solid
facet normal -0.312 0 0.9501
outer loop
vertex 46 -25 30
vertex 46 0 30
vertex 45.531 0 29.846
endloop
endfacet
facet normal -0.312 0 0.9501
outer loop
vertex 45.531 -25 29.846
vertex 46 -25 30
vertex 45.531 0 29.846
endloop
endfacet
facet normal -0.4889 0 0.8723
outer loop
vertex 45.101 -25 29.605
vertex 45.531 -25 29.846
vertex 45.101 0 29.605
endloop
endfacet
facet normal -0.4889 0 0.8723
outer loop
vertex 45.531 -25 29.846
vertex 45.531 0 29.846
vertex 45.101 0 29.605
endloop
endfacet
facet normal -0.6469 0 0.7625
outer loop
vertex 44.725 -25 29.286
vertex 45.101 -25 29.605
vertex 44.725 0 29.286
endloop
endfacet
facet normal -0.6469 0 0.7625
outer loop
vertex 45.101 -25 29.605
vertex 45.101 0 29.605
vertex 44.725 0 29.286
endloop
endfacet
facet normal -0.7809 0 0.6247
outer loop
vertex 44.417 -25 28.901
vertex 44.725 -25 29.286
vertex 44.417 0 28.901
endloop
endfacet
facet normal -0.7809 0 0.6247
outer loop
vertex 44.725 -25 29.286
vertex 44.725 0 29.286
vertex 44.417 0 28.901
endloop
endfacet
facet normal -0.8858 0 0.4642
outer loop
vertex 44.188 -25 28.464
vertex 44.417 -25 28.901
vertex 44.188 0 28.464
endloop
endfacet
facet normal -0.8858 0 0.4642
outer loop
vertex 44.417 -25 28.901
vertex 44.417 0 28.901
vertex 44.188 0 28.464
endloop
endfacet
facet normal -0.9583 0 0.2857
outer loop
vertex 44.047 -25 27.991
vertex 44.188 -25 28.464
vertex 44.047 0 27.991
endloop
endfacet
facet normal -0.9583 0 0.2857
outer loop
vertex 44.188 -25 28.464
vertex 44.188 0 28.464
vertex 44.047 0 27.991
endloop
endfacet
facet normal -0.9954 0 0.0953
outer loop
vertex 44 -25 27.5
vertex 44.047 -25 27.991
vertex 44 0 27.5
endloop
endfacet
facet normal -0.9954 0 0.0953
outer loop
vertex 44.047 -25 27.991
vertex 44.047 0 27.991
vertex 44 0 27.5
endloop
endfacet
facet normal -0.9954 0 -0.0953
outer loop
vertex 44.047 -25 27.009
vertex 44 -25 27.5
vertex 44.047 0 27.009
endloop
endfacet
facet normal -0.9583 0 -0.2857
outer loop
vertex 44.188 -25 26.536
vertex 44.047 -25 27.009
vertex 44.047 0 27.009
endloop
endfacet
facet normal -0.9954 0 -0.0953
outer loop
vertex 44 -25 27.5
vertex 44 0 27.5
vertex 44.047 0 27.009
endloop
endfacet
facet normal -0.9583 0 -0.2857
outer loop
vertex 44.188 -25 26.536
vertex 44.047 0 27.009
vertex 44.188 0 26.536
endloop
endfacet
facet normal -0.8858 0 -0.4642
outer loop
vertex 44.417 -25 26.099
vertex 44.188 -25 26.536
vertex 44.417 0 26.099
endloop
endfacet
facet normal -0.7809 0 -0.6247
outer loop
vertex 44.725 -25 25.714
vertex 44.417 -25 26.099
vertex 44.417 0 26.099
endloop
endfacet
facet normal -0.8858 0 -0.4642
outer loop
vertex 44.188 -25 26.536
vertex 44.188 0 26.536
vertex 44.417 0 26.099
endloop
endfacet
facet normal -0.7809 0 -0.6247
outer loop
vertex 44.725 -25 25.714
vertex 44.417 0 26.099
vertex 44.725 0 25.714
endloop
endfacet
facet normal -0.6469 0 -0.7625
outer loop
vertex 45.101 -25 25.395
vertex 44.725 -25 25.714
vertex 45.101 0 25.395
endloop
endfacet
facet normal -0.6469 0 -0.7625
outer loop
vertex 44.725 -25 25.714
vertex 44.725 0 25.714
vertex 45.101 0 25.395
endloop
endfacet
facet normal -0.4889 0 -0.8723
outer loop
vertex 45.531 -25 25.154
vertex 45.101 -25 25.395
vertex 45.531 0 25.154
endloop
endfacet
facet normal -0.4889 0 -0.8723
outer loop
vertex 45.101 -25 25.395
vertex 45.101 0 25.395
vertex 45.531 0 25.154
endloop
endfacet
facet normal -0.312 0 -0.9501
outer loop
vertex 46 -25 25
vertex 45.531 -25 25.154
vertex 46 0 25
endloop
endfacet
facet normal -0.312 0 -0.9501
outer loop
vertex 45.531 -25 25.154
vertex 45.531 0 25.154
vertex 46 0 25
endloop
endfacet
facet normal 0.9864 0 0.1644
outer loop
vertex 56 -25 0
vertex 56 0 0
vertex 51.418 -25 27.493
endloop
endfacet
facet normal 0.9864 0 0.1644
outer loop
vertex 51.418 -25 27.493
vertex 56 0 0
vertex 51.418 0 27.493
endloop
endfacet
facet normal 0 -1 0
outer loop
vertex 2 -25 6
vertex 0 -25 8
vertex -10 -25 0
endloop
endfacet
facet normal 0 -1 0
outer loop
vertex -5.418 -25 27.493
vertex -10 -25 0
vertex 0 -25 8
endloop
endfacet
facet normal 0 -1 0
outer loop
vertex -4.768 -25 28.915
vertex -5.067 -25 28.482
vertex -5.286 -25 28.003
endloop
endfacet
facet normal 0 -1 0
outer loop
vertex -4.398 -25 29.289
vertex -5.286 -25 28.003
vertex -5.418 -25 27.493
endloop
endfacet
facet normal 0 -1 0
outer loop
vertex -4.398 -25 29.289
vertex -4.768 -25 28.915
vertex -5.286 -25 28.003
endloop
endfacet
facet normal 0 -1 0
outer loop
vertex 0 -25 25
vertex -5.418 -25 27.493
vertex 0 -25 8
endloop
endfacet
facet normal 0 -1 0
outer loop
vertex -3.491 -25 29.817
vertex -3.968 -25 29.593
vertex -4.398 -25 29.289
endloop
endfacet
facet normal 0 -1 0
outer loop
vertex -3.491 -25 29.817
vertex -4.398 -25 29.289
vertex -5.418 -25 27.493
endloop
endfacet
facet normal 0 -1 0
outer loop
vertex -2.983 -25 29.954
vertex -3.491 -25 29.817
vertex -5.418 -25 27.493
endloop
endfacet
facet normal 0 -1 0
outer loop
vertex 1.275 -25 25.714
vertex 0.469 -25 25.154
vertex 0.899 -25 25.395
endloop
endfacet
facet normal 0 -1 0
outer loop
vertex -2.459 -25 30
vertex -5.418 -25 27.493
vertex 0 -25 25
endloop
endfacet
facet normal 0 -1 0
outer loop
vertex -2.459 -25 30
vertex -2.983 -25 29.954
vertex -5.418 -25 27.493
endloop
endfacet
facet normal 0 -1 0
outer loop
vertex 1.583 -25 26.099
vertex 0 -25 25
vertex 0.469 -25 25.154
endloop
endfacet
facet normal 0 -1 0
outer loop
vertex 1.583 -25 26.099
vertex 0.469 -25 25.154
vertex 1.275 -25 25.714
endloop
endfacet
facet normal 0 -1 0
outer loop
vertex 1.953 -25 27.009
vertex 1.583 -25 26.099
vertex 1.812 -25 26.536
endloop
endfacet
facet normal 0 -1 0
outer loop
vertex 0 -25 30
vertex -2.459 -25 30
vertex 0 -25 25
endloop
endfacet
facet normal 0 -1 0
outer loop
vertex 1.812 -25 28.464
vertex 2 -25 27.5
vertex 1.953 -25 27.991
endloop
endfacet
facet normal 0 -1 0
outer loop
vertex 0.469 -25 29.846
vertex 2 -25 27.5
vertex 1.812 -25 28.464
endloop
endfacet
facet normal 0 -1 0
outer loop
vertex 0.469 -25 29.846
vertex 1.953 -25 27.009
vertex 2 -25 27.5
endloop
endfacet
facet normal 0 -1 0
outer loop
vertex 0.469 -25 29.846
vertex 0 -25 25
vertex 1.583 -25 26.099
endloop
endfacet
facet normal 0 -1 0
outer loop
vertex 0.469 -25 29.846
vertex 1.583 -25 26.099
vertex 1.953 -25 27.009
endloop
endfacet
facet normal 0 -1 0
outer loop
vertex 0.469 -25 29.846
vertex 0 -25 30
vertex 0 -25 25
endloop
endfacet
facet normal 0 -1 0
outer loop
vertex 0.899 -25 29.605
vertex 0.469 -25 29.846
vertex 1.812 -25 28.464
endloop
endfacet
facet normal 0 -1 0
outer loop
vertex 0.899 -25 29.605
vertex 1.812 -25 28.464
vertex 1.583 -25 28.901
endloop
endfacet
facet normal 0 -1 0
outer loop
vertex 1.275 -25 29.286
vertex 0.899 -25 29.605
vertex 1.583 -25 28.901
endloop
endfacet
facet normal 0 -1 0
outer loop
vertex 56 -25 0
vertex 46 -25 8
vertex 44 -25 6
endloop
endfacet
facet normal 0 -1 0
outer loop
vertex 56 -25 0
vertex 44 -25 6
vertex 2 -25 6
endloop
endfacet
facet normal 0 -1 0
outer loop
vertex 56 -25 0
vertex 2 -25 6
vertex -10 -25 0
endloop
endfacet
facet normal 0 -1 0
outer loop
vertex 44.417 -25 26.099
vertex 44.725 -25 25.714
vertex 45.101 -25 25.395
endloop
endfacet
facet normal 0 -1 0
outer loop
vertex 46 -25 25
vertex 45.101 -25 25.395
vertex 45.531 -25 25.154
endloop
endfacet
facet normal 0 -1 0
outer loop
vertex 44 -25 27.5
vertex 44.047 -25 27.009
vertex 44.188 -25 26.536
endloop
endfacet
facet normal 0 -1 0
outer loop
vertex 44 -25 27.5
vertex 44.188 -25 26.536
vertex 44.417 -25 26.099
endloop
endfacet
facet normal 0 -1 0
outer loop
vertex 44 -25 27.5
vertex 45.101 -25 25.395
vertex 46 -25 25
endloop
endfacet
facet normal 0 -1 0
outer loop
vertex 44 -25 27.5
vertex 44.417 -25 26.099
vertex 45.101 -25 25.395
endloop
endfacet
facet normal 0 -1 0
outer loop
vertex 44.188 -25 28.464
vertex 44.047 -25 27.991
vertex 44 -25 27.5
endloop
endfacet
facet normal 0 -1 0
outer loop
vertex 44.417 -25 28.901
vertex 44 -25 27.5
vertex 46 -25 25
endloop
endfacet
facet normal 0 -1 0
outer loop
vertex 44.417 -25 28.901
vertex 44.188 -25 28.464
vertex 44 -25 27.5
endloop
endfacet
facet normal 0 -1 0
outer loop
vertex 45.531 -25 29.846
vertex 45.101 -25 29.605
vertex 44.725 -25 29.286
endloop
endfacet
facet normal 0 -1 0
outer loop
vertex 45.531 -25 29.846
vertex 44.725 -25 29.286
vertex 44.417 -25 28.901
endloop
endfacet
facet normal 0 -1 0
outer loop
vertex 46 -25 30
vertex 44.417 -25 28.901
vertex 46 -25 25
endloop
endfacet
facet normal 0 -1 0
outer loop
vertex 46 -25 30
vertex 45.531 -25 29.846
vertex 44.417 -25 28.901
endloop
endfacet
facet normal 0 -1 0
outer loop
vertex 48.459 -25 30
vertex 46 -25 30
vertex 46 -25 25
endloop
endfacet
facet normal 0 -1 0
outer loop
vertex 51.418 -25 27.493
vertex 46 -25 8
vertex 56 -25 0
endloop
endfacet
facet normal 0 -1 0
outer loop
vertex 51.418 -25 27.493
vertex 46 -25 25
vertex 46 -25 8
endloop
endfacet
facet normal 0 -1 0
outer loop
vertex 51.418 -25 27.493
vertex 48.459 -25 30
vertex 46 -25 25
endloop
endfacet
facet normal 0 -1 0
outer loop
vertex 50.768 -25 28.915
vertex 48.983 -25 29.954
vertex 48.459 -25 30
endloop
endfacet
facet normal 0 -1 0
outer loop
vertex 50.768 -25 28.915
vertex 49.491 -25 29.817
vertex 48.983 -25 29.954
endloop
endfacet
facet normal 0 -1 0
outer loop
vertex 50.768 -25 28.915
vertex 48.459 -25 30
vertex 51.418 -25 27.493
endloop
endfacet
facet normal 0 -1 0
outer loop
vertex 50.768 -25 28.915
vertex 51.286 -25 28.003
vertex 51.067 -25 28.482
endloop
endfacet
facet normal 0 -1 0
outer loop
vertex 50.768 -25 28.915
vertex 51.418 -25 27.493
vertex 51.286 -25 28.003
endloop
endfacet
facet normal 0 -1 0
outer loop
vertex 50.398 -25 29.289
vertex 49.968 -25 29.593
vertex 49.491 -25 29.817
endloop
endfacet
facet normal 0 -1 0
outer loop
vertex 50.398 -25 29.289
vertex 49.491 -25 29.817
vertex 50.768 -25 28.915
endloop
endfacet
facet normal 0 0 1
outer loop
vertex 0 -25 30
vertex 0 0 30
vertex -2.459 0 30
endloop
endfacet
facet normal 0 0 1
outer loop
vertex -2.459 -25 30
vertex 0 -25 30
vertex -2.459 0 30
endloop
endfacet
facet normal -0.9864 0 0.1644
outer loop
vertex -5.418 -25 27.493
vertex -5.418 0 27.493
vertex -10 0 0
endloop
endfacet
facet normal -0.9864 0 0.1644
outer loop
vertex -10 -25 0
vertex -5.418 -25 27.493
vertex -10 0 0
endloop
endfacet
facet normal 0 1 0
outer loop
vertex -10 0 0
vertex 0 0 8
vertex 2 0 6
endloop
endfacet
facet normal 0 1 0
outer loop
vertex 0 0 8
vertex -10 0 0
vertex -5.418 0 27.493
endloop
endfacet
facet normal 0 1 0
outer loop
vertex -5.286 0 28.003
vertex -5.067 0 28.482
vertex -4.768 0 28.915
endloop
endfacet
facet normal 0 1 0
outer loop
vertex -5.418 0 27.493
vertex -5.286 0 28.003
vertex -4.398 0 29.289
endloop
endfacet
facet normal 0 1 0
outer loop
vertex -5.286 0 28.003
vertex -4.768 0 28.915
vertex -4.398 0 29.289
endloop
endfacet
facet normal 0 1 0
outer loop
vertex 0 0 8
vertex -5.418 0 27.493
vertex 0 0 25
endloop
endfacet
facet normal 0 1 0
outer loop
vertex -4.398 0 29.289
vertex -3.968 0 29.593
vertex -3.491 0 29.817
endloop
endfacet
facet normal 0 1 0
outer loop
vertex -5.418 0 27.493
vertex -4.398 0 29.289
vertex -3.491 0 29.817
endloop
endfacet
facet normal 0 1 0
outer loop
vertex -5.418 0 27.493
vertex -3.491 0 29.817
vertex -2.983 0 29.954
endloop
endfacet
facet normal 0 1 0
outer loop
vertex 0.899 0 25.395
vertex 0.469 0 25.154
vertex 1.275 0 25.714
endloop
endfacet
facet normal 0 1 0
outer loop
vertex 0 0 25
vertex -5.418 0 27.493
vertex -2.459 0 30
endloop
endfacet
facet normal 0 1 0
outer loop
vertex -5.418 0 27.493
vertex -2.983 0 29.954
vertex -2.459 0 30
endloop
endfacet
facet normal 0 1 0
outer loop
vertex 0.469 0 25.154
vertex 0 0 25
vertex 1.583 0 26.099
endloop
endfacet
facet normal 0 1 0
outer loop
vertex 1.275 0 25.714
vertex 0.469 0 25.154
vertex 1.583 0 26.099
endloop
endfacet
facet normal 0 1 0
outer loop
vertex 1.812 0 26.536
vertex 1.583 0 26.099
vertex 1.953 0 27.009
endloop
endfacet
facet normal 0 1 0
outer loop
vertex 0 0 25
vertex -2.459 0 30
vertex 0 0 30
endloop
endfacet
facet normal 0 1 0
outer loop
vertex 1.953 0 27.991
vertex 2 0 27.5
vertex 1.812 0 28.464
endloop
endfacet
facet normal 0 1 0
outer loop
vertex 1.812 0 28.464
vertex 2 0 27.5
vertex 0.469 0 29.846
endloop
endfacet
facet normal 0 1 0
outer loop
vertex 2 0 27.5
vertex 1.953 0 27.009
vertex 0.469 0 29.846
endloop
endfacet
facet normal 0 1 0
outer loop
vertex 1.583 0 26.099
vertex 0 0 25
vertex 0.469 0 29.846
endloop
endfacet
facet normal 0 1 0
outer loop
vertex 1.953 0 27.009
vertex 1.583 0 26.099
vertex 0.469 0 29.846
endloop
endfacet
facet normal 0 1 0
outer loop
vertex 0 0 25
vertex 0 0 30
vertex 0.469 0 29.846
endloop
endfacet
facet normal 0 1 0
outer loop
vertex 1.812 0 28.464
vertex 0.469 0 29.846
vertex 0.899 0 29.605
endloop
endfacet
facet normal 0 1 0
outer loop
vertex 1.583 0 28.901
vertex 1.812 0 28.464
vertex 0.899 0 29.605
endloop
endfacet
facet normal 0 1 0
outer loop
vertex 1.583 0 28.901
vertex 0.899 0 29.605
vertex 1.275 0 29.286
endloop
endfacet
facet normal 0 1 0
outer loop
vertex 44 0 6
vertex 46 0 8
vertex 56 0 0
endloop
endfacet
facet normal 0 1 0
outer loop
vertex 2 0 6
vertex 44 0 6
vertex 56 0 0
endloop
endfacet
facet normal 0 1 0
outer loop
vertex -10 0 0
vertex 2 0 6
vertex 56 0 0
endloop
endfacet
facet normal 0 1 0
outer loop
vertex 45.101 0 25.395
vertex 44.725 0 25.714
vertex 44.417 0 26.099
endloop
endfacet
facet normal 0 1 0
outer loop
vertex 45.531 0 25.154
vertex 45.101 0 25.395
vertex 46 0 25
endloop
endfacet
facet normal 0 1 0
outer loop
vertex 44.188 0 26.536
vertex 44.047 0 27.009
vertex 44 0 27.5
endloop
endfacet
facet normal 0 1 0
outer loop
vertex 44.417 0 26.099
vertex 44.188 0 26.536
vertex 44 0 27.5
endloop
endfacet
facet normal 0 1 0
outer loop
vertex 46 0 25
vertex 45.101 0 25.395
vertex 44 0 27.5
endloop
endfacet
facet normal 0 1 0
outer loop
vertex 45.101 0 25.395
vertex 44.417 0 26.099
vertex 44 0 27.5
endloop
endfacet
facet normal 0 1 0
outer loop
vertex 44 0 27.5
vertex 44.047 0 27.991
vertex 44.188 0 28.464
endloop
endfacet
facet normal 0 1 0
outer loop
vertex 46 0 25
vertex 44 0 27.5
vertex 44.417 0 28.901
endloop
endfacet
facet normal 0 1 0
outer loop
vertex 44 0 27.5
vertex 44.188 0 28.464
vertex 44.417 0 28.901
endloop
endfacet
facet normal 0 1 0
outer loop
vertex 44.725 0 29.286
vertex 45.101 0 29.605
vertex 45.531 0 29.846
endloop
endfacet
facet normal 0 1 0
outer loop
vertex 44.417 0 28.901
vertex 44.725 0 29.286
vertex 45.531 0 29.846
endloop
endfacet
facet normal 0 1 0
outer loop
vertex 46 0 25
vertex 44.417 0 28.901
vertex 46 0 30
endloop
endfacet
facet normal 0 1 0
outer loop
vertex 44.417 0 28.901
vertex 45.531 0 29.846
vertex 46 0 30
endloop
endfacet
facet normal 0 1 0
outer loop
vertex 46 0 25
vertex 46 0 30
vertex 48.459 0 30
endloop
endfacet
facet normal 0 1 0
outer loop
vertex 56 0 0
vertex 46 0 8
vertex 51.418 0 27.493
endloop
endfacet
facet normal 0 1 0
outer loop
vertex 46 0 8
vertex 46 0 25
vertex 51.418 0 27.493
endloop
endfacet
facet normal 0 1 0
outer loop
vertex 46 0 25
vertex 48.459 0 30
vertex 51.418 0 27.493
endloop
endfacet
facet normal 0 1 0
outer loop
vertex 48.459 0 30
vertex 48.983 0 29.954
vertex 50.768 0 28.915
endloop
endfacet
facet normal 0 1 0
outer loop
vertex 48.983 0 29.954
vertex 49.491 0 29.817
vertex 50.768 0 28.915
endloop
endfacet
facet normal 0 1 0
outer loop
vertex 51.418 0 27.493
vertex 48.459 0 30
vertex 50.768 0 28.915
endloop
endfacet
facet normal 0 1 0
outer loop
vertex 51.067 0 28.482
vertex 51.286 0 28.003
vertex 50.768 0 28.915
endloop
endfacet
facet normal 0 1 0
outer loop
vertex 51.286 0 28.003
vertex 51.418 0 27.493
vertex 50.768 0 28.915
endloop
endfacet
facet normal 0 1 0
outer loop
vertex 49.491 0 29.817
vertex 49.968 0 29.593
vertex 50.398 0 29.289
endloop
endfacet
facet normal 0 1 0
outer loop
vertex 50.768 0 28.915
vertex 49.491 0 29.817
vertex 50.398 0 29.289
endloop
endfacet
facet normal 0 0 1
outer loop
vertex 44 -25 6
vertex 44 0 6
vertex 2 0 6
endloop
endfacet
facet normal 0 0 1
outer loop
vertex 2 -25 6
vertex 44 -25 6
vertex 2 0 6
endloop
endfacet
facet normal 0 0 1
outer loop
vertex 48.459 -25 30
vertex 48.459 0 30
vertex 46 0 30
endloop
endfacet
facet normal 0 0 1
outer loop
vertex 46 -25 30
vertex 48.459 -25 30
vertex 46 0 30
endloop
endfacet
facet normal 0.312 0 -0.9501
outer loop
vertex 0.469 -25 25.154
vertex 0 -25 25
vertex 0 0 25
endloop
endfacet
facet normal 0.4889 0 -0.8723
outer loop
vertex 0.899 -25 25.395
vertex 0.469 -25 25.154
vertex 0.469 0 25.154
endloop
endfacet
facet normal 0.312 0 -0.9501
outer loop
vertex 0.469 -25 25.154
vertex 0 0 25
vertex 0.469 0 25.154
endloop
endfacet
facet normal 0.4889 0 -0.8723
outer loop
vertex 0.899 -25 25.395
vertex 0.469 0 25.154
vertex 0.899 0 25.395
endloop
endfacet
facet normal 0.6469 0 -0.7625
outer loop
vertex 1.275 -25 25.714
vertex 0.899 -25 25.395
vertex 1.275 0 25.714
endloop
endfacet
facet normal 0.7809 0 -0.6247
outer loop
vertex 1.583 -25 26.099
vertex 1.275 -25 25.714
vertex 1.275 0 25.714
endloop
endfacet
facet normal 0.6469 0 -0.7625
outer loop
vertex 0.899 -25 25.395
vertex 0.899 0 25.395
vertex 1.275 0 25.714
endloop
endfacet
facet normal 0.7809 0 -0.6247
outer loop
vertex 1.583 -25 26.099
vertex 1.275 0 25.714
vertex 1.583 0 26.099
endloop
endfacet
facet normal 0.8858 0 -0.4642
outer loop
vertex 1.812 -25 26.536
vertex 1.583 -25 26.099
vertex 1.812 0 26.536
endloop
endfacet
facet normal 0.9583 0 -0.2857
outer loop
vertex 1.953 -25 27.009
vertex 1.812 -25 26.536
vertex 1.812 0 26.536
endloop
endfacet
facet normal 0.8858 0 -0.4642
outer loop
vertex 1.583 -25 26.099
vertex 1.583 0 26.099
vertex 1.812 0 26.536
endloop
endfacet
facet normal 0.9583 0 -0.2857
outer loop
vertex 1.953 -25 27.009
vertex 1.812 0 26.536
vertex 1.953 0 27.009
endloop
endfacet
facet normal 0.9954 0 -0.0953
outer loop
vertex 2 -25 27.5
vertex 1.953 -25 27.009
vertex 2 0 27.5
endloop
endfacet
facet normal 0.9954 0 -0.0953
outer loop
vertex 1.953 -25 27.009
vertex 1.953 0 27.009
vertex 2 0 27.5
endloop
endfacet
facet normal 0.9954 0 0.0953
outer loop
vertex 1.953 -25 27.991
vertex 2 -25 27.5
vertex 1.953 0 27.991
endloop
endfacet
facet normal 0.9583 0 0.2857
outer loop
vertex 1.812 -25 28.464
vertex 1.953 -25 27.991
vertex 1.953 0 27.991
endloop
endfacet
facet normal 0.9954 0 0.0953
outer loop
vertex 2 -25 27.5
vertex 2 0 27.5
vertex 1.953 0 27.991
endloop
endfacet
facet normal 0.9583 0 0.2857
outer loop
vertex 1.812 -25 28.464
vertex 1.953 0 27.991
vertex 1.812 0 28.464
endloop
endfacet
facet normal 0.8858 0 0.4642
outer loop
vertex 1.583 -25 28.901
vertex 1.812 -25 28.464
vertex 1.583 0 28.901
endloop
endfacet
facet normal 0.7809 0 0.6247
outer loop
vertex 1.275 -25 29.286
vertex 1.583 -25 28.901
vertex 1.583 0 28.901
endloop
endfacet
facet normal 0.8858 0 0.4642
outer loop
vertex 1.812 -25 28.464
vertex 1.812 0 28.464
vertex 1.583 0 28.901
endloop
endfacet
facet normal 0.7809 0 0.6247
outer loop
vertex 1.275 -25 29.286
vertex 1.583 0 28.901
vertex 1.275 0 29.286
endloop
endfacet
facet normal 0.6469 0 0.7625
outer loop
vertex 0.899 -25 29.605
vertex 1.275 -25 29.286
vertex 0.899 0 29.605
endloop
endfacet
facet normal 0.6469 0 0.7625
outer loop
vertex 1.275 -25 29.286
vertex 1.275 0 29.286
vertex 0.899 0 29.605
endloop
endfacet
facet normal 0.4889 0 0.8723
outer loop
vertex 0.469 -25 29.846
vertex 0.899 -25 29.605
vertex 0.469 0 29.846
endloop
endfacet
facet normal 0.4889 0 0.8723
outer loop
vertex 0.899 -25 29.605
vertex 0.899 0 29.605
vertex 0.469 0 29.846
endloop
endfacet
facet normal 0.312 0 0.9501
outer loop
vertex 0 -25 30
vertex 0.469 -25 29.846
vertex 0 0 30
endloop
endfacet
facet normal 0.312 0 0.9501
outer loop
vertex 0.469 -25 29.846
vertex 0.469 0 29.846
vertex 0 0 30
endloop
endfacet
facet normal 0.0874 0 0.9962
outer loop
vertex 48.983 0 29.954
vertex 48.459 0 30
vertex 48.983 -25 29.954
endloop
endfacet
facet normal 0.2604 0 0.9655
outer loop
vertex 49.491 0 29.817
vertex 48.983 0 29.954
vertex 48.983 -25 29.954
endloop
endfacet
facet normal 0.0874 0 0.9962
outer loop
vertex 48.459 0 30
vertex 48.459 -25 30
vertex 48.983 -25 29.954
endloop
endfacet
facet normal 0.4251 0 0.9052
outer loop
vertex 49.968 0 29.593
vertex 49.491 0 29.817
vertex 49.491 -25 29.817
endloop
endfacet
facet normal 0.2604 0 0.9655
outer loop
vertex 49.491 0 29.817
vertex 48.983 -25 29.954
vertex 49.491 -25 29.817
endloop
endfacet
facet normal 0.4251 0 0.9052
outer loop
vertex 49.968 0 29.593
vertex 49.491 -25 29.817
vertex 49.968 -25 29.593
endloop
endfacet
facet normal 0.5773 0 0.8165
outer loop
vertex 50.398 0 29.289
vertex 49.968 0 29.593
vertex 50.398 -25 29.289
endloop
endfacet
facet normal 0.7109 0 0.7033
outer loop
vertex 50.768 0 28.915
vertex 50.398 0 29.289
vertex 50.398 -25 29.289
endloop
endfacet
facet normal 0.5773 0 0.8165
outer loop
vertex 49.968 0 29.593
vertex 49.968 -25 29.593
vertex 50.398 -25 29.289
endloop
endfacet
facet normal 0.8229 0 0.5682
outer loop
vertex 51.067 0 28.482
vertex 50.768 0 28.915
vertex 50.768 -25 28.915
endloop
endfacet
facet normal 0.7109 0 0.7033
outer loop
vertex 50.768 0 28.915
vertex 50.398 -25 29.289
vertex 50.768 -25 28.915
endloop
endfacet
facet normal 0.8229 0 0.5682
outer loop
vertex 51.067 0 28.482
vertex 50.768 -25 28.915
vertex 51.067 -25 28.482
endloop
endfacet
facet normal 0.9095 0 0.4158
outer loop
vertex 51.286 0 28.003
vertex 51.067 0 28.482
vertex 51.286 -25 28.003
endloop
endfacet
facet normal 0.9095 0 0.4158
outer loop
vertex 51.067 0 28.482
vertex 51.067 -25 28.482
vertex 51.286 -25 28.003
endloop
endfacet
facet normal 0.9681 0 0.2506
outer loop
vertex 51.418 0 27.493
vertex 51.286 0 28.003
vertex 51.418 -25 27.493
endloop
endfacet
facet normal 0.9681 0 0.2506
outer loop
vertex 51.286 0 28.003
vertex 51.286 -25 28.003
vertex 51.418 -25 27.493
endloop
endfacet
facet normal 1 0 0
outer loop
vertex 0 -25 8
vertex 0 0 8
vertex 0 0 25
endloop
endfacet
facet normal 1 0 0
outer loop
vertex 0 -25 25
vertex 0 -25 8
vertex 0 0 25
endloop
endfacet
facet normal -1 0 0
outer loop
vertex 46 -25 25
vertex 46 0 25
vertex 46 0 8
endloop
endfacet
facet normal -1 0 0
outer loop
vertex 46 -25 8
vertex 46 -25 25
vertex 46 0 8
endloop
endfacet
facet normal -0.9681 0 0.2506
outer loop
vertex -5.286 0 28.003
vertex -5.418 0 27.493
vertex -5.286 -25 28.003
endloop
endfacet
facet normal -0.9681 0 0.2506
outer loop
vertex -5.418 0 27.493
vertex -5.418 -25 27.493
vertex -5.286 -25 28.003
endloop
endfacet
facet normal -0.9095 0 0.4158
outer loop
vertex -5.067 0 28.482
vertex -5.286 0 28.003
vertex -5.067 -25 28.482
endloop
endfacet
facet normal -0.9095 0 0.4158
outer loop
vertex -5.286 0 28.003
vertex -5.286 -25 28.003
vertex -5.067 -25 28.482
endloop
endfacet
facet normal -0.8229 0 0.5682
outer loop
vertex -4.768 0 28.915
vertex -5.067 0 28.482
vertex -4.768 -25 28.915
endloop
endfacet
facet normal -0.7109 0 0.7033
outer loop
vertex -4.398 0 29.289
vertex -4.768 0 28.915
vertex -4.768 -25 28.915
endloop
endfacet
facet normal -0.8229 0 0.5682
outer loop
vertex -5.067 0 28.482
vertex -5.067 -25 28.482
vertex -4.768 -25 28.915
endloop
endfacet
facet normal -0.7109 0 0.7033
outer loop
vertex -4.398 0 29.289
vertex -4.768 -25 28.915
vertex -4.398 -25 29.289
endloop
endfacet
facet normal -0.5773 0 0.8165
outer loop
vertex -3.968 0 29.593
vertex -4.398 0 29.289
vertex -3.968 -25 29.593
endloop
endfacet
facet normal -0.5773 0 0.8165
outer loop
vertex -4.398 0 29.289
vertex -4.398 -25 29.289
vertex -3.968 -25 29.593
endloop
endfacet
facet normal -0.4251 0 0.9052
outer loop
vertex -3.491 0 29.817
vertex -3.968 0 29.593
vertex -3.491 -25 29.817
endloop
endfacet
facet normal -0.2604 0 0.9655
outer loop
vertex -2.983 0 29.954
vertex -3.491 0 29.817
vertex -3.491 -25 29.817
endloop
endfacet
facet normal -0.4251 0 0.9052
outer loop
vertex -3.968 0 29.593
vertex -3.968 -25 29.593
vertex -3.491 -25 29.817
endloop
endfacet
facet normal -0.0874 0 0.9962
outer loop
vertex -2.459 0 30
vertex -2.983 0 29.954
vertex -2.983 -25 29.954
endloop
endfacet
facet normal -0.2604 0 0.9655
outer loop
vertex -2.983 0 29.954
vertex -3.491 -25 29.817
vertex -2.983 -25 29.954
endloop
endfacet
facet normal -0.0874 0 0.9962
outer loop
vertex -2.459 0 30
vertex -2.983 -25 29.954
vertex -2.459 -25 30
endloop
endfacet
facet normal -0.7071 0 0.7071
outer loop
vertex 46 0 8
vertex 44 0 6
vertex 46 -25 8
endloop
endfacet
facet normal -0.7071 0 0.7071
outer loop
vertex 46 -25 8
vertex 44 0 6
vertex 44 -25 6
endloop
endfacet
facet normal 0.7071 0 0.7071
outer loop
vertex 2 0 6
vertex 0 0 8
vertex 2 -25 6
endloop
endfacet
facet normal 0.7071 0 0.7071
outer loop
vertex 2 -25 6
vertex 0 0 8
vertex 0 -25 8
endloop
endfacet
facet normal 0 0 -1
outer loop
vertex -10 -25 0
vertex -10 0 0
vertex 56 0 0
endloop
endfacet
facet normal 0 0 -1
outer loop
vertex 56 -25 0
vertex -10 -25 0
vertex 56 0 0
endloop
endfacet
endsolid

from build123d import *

# Parameters (mm, degrees)
F1_DEPTH = 25
F2_SIZE  = 2
F3_R     = 3


with BuildPart() as f1:
    # F0 (on Front) → F1 (new body)
    with BuildSketch(Plane.XZ):
        Polygon((-5, 30), (-10, 0), (56, 0), (51, 30), (46, 30), (46, 25), (46, 6), (0, 6), (0, 25), (0, 30), align=None)
        with BuildLine():
            ThreePointArc((0, 25), (2, 27.5), (0, 30))
            Line((0, 30), (0, 25))
        make_face()
        with BuildLine():
            Line((46, 25), (46, 30))
            ThreePointArc((46, 30), (44, 27.5), (46, 25))
        make_face()
    extrude(amount=F1_DEPTH)

    # F2
    f2_edges = [f1.edges().sort_by_distance(p)[0] for p in [
        (46, -12.5, 6),
        (0, -12.5, 6),
    ]]
    chamfer(f2_edges, length=F2_SIZE)

    # F3
    f3_edges = [f1.edges().sort_by_distance(p)[0] for p in [
        (51, -12.5, 30),
        (-5, -12.5, 30),
    ]]
    fillet(f3_edges, radius=F3_R)


solid = f1.part
